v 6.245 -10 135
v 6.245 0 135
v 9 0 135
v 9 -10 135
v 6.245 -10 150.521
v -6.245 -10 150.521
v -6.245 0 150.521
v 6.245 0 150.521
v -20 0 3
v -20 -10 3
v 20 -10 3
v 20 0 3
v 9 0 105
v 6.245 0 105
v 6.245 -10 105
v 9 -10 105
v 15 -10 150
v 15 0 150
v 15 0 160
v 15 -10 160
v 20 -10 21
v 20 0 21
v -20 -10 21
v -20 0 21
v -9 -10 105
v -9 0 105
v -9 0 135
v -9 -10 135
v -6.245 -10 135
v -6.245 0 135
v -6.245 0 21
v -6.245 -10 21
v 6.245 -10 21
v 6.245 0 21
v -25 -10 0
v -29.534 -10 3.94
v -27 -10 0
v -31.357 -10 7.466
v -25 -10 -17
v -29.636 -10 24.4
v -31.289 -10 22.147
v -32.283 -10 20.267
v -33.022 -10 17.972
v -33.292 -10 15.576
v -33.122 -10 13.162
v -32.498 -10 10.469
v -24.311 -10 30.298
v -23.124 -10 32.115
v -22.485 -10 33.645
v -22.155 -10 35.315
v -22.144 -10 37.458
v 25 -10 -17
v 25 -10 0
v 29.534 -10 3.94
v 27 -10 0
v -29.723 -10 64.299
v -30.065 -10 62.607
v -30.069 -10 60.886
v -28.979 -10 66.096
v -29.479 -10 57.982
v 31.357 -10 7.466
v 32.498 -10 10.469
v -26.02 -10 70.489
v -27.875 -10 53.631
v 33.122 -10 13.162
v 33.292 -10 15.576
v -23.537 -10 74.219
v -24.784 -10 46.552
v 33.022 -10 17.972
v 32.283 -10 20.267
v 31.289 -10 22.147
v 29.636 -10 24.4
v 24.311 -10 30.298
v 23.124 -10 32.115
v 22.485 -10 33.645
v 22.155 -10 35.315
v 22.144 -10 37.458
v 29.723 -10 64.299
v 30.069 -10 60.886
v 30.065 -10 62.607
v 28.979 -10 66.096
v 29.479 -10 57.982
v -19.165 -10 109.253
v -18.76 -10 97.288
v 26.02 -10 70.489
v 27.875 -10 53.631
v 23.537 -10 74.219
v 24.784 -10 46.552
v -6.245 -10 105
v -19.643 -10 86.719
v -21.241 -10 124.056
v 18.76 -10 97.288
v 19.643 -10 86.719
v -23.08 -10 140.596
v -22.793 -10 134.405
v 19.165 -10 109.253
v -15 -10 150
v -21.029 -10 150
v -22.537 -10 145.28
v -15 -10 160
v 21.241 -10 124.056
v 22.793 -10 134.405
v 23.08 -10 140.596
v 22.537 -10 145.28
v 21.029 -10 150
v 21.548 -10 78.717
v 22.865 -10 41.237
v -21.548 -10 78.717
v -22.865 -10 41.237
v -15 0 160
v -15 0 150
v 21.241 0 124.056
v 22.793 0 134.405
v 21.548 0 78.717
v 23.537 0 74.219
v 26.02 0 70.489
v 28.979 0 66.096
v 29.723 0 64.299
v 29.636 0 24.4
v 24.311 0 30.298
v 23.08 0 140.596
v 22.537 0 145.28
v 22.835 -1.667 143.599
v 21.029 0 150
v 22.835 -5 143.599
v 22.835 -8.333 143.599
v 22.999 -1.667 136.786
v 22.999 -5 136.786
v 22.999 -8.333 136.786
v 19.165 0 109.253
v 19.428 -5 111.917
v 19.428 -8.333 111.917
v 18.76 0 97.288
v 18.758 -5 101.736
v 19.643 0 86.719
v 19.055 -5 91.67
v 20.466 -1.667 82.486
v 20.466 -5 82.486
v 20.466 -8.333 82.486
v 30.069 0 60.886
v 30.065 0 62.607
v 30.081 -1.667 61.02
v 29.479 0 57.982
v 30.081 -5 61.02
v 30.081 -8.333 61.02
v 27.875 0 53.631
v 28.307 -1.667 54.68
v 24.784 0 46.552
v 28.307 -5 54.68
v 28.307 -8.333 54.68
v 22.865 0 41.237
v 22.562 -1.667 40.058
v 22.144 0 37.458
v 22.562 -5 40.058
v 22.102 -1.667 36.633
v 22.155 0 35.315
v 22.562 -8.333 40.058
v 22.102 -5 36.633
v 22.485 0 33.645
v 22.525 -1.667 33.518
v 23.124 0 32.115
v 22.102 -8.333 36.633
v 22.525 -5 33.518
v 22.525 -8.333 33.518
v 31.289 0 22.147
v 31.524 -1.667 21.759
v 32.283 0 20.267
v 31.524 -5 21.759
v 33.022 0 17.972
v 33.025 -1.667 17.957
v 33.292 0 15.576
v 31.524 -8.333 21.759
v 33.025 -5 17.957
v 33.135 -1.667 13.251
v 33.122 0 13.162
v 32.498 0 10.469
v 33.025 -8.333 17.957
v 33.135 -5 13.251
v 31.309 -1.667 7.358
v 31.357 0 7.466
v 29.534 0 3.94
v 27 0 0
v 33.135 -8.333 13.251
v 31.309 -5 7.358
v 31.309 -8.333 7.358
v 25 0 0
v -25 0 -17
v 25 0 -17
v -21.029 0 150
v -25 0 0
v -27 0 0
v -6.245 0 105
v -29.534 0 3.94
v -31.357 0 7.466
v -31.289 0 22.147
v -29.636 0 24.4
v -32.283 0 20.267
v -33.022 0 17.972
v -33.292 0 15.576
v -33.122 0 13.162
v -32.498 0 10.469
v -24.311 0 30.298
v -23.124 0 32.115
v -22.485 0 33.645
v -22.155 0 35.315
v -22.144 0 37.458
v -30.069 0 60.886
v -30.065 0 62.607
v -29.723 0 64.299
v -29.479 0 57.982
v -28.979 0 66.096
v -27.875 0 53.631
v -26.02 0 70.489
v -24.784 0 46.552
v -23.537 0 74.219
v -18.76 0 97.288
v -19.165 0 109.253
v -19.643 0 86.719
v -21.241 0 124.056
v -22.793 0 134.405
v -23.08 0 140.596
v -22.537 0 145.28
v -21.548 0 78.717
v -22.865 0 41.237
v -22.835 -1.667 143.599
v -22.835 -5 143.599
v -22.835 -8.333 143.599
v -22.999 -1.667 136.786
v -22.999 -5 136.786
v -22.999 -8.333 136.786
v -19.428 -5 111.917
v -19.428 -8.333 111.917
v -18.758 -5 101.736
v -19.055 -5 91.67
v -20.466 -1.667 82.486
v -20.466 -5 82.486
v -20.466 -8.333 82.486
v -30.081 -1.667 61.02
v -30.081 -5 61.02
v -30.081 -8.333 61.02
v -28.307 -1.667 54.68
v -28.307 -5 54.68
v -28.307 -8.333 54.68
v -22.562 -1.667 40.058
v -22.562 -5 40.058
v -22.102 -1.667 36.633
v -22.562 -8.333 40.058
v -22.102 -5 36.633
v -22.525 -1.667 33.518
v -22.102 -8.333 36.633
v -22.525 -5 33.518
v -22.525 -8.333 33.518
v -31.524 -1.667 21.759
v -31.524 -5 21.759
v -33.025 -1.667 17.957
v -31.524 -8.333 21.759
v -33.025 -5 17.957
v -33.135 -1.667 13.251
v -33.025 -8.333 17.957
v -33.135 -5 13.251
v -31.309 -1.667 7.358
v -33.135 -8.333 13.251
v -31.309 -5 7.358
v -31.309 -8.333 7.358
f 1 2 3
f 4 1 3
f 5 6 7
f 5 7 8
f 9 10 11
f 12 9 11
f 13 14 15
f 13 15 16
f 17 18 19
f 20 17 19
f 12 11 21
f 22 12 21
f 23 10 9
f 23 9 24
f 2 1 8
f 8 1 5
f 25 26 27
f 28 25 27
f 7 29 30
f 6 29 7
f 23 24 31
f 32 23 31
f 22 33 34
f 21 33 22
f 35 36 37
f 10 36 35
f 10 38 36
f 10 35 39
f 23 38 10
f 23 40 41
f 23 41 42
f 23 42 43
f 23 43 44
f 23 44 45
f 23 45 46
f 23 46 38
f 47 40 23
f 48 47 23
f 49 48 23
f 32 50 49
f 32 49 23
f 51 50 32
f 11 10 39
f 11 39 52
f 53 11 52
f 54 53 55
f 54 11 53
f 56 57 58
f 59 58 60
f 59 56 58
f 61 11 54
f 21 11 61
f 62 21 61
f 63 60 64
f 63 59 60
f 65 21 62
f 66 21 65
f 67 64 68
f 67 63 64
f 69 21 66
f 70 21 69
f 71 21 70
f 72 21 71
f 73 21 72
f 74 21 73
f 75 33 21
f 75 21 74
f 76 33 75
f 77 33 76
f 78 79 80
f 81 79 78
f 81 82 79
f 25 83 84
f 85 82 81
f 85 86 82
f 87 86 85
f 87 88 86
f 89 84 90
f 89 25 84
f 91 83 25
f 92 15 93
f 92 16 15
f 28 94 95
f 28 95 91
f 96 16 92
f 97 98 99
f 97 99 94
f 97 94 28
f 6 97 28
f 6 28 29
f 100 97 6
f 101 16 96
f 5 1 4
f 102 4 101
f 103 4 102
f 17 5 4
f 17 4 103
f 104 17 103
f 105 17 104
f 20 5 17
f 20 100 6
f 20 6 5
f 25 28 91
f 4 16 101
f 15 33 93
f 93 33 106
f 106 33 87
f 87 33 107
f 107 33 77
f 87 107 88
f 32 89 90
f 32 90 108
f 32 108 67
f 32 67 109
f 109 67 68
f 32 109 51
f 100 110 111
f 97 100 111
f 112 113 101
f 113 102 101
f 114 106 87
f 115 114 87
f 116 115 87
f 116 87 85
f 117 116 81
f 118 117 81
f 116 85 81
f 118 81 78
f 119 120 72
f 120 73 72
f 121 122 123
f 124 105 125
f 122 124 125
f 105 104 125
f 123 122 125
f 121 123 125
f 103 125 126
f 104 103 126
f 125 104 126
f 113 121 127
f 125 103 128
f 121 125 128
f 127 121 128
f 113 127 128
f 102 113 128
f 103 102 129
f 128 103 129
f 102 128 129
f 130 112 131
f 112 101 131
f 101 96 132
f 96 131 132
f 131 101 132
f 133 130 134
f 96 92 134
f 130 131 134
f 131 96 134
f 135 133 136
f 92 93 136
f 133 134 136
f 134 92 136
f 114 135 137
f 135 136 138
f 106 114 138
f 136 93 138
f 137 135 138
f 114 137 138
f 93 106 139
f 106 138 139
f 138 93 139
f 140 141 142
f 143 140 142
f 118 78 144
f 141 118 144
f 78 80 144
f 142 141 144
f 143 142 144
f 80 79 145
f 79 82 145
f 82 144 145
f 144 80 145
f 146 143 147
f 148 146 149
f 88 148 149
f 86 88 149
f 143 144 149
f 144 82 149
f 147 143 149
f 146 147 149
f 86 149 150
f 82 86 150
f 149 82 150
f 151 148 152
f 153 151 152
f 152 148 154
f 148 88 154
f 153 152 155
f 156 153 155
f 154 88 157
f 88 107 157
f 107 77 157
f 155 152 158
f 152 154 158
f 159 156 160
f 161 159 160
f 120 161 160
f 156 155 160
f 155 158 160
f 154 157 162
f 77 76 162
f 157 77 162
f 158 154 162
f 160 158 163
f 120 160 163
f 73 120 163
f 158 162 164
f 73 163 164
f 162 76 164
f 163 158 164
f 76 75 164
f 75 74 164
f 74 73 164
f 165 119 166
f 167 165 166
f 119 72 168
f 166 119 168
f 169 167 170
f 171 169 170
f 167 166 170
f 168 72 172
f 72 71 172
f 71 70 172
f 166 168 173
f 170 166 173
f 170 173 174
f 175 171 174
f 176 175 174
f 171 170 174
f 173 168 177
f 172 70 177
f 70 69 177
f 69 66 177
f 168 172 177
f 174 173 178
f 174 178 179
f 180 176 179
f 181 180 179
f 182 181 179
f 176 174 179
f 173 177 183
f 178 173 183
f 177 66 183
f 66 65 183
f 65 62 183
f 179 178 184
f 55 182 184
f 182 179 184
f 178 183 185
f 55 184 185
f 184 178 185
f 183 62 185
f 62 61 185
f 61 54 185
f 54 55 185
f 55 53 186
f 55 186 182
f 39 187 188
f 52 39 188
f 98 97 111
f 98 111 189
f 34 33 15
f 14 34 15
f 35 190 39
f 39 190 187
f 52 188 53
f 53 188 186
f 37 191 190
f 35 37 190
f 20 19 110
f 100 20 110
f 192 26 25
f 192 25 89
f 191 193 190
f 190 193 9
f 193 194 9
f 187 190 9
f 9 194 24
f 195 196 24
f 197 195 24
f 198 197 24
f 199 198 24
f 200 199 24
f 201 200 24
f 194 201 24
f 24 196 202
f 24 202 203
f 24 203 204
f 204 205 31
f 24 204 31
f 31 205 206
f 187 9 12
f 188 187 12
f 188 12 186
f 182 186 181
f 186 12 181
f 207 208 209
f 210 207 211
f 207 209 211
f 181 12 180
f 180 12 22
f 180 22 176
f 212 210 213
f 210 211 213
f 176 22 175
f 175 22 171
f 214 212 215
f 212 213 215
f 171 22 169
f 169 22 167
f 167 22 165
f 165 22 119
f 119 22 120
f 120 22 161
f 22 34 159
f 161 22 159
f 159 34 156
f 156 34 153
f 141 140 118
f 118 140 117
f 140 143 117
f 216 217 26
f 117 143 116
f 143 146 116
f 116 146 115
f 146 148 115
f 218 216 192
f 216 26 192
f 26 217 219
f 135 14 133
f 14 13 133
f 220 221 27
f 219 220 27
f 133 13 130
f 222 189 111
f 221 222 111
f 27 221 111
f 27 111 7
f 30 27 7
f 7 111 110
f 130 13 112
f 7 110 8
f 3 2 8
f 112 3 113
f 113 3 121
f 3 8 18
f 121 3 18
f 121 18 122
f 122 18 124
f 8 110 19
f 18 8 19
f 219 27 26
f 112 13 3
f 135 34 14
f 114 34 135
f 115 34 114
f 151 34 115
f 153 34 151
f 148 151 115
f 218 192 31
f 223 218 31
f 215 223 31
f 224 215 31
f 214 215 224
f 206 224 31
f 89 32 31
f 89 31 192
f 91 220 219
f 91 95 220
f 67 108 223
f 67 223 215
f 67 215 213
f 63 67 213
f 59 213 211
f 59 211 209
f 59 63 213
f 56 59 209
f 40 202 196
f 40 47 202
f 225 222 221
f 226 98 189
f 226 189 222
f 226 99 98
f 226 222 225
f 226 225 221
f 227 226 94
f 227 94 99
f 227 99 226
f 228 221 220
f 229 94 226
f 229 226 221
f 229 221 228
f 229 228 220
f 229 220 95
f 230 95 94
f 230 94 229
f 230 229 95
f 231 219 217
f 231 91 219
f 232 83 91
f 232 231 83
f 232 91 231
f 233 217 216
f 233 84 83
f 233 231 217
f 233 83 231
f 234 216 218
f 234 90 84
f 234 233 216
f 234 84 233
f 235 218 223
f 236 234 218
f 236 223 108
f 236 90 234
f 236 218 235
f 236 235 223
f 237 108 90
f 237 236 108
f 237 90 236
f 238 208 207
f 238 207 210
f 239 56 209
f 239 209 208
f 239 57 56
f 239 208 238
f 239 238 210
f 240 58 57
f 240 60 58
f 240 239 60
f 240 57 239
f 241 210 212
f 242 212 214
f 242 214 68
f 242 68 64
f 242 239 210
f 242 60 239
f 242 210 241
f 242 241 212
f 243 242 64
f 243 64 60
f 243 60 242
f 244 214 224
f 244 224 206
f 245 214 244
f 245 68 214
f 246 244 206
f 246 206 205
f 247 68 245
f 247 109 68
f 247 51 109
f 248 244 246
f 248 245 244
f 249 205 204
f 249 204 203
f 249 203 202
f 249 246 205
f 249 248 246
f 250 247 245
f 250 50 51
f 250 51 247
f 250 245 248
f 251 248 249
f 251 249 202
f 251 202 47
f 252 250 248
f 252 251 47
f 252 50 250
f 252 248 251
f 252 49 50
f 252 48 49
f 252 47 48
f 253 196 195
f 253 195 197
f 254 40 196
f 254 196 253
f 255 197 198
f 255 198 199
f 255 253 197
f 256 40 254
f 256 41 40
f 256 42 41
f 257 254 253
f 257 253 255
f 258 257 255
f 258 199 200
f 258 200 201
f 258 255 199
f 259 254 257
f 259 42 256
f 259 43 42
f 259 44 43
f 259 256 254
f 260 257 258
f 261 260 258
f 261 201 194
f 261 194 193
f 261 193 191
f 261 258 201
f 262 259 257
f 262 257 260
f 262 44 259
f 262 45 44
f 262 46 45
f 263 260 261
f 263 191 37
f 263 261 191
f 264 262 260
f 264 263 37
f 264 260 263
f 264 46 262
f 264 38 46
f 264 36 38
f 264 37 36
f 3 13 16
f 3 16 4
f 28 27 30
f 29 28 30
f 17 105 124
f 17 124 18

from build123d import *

# Parameters (mm, degrees)
F0_W     = 20
F0_H     = 18
F0_W_2   = 18
F0_H_2   = 30
F1_DEPTH = 10
F3_DEPTH = 10
F4_W     = 12.4899959968
F4_H     = 129.5212038755
F5_DEPTH = 25
F6_W     = 10
F6_H     = 18
F7_DEPTH = 25


with BuildPart() as f1:
    # F0 (on Front) → F1 (new body)
    with BuildSketch(Plane.XZ):
        Polygon((-15, 0), (-25, 0), (-25, -17), (25, -17), (25, 0), (15, 0), (15, 160), (-15, 160), align=None)
        with Locations((0, 12)):
            Rectangle(F0_W, F0_H, mode=Mode.SUBTRACT)
        with Locations((0, 120)):
            Rectangle(F0_W_2, F0_H_2, mode=Mode.SUBTRACT)
    extrude(amount=F1_DEPTH)

    # F2 (on face) → F3 (join)
    with BuildSketch(Plane.XZ.offset(10)):
        with BuildLine():
            Line((-15, 150), (-21.0292486188, 150))
            add(Edge.make_bspline(
                [(-21.0292486188, 150), (-21.8759584302, 148.001282676), (-24.8980712464, 137.9744187621), (-17.2944008466, 112.5484863306), (-19.1315799921, 73.8118713362), (-36.5433909892, 62.6372447051), (-9.6453426201, 27.9646895652), (-42.2846944801, 21.8256817725), (-27, 0)],
                knots=[0.0884560158, 0.0884560158, 0.0884560158, 0.0884560158, 0.1370648704, 0.3185486056, 0.5145047689, 0.6413495139, 0.8130466565, 1, 1, 1, 1], degree=3))
            Line((-27, 0), (-15, 0))
            Line((-15, 0), (-15, 150))
        make_face()
        with BuildLine():
            Line((21.0292486188, 150), (15, 150))
            Line((15, 150), (15, 0))
            Line((15, 0), (27, 0))
            add(Edge.make_bspline(
                [(21.0292486188, 150), (21.8759584302, 148.001282676), (24.8980712464, 137.9744187621), (17.2944008466, 112.5484863306), (19.1315799921, 73.8118713362), (36.5433909892, 62.6372447051), (9.6453426201, 27.9646895652), (42.2846944801, 21.8256817725), (27, 0)],
                knots=[0.0884560158, 0.0884560158, 0.0884560158, 0.0884560158, 0.1370648704, 0.3185486056, 0.5145047689, 0.6413495139, 0.8130466565, 1, 1, 1, 1], degree=3))
        make_face()
    extrude(amount=-F3_DEPTH)

    # F4 (on face) → F5 (cut)
    with BuildSketch(Plane.XZ.offset(10)):
        with Locations((0, 85.7606019378)):
            Rectangle(F4_W, F4_H)
    extrude(amount=-F5_DEPTH, mode=Mode.SUBTRACT)

    # F6 (on face) → F7 (cut)
    with BuildSketch(Plane.XZ.offset(10)):
        with Locations((-15, 12)):
            Rectangle(F6_W, F6_H)
        with Locations((15, 12)):
            Rectangle(F6_W, F6_H)
    extrude(amount=-F7_DEPTH, mode=Mode.SUBTRACT)


solid = f1.part
